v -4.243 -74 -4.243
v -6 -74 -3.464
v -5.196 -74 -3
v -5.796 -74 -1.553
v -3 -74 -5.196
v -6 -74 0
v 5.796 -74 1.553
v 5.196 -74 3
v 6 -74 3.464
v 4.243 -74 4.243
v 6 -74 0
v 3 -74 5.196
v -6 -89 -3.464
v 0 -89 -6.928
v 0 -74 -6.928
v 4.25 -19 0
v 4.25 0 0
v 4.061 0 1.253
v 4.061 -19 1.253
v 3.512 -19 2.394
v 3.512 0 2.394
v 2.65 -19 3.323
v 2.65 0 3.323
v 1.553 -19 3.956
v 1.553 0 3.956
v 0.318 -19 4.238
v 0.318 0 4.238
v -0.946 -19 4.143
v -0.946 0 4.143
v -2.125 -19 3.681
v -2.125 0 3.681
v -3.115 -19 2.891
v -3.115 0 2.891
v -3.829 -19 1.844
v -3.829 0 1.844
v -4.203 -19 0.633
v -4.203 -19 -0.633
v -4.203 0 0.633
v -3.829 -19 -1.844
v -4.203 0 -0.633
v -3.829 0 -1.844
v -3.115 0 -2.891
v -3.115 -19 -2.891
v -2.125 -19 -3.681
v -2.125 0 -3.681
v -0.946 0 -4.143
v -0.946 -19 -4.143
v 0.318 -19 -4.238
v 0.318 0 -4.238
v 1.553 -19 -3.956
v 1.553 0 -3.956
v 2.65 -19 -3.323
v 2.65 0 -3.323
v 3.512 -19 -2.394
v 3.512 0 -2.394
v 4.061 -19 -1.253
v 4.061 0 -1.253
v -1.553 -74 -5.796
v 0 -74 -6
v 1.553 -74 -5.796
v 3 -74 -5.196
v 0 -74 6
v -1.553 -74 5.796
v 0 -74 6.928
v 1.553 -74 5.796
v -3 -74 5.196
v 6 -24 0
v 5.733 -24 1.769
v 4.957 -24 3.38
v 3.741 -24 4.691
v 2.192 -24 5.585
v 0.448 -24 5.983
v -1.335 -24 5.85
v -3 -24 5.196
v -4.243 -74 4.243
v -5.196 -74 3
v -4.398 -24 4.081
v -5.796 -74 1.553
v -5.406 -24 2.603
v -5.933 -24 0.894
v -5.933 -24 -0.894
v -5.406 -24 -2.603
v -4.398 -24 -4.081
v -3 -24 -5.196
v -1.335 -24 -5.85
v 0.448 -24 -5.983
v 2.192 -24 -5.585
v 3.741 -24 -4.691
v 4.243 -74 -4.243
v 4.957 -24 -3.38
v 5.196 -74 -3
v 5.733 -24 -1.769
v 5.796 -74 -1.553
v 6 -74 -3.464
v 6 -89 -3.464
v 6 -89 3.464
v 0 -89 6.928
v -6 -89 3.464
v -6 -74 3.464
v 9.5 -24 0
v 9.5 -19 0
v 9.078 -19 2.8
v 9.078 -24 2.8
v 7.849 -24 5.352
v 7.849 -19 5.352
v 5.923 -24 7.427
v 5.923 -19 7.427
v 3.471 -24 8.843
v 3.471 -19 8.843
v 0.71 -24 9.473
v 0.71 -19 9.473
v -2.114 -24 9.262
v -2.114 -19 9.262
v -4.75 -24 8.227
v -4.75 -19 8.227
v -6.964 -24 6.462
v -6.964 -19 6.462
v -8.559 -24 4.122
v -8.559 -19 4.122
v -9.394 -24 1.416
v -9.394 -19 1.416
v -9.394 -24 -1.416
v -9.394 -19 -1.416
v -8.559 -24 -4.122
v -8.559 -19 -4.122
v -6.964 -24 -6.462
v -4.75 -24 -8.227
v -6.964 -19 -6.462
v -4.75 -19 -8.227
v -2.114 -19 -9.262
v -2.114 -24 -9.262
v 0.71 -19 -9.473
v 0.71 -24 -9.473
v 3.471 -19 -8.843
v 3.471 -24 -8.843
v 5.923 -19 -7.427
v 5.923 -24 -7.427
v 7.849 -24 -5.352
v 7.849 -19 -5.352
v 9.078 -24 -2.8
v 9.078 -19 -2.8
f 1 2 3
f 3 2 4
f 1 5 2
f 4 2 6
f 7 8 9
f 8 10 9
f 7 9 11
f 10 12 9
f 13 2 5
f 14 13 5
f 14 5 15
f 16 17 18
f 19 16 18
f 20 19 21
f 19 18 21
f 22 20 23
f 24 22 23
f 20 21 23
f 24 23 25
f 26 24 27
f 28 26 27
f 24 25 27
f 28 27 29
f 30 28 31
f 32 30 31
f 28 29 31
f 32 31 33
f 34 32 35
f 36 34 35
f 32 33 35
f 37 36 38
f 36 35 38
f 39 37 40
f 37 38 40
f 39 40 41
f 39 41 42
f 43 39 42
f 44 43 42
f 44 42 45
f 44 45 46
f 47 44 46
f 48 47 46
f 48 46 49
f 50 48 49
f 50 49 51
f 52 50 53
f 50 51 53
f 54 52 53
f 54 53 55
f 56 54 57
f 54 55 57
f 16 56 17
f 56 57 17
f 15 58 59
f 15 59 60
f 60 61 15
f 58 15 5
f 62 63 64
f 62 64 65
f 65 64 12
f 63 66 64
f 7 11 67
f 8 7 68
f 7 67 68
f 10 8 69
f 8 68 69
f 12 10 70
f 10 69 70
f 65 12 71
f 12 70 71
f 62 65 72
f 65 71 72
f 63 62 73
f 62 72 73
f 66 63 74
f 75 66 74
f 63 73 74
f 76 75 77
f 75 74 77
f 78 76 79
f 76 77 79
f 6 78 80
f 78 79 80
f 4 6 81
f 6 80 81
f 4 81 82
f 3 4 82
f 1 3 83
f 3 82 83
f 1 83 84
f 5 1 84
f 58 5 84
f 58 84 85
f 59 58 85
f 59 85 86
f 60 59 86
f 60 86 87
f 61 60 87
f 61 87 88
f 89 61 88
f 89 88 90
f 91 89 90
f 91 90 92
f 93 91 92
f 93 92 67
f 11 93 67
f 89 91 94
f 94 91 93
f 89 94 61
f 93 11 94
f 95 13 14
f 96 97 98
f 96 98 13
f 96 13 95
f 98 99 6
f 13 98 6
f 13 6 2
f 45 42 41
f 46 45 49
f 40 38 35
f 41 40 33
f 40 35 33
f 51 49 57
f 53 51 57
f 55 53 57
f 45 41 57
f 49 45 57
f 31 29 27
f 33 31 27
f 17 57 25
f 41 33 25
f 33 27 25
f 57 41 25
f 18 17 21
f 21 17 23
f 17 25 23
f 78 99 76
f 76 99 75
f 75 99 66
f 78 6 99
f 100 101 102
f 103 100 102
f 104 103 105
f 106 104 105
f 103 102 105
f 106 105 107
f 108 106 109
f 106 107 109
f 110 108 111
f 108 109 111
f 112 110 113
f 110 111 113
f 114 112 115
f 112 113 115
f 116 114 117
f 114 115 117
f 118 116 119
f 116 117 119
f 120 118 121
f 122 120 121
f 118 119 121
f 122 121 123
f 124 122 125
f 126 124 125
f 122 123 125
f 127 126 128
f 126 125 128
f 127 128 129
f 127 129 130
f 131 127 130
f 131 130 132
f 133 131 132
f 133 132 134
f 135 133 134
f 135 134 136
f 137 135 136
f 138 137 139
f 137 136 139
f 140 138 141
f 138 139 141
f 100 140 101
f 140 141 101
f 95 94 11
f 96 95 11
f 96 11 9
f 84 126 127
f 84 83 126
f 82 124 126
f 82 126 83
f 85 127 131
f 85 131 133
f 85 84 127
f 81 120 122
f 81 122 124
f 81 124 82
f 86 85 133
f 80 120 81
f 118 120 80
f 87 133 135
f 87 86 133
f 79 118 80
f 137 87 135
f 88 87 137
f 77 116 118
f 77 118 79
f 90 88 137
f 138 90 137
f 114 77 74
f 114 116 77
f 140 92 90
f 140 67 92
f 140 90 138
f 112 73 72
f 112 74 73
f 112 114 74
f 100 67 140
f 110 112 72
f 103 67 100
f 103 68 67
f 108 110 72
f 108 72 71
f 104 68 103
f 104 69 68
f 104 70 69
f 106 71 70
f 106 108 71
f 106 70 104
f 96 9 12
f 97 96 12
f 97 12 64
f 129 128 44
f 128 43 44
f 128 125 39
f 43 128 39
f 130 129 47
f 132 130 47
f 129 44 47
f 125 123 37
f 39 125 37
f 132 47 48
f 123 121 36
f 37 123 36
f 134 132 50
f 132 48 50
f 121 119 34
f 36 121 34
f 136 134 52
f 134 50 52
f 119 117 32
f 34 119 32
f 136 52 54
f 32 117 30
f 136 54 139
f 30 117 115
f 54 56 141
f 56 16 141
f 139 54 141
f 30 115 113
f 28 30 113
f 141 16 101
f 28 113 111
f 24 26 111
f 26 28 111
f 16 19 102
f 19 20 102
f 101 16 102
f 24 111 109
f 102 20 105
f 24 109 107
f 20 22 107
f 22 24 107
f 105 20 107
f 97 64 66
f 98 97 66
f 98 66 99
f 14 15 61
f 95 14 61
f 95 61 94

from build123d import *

# Parameters (mm, degrees)
F0_R     = 4.25
F1_DEPTH = 19
F2_R     = 9.5
F2_R_2   = 4.25
F3_DEPTH = 5
F4_R     = 6
F5_DEPTH = 50
F7_DEPTH = 15


with BuildPart() as f1:
    # F0 (on Front) → F1 (new body)
    with BuildSketch(Plane.XZ):
        Circle(F0_R)
    extrude(amount=F1_DEPTH)

    # F2 (on face) → F3 (join)
    with BuildSketch(Plane.XZ.offset(19)):
        Circle(F2_R)
        Circle(F2_R_2, mode=Mode.SUBTRACT)
        Circle(F2_R_2)
    extrude(amount=F3_DEPTH)

    # F4 (on face) → F5 (join)
    with BuildSketch(Plane.XZ.offset(24)):
        Circle(F4_R)
    extrude(amount=F5_DEPTH)

    # F6 (on face) → F7 (join)
    with BuildSketch(Plane.XZ.offset(74)):
        Polygon((6, -3.4641016151), (6, 3.4641016151), (0, 6.9282032303), (-6, 3.4641016151), (-6, -3.4641016151), (0, -6.9282032303), align=None)
    extrude(amount=F7_DEPTH)


solid = f1.part
